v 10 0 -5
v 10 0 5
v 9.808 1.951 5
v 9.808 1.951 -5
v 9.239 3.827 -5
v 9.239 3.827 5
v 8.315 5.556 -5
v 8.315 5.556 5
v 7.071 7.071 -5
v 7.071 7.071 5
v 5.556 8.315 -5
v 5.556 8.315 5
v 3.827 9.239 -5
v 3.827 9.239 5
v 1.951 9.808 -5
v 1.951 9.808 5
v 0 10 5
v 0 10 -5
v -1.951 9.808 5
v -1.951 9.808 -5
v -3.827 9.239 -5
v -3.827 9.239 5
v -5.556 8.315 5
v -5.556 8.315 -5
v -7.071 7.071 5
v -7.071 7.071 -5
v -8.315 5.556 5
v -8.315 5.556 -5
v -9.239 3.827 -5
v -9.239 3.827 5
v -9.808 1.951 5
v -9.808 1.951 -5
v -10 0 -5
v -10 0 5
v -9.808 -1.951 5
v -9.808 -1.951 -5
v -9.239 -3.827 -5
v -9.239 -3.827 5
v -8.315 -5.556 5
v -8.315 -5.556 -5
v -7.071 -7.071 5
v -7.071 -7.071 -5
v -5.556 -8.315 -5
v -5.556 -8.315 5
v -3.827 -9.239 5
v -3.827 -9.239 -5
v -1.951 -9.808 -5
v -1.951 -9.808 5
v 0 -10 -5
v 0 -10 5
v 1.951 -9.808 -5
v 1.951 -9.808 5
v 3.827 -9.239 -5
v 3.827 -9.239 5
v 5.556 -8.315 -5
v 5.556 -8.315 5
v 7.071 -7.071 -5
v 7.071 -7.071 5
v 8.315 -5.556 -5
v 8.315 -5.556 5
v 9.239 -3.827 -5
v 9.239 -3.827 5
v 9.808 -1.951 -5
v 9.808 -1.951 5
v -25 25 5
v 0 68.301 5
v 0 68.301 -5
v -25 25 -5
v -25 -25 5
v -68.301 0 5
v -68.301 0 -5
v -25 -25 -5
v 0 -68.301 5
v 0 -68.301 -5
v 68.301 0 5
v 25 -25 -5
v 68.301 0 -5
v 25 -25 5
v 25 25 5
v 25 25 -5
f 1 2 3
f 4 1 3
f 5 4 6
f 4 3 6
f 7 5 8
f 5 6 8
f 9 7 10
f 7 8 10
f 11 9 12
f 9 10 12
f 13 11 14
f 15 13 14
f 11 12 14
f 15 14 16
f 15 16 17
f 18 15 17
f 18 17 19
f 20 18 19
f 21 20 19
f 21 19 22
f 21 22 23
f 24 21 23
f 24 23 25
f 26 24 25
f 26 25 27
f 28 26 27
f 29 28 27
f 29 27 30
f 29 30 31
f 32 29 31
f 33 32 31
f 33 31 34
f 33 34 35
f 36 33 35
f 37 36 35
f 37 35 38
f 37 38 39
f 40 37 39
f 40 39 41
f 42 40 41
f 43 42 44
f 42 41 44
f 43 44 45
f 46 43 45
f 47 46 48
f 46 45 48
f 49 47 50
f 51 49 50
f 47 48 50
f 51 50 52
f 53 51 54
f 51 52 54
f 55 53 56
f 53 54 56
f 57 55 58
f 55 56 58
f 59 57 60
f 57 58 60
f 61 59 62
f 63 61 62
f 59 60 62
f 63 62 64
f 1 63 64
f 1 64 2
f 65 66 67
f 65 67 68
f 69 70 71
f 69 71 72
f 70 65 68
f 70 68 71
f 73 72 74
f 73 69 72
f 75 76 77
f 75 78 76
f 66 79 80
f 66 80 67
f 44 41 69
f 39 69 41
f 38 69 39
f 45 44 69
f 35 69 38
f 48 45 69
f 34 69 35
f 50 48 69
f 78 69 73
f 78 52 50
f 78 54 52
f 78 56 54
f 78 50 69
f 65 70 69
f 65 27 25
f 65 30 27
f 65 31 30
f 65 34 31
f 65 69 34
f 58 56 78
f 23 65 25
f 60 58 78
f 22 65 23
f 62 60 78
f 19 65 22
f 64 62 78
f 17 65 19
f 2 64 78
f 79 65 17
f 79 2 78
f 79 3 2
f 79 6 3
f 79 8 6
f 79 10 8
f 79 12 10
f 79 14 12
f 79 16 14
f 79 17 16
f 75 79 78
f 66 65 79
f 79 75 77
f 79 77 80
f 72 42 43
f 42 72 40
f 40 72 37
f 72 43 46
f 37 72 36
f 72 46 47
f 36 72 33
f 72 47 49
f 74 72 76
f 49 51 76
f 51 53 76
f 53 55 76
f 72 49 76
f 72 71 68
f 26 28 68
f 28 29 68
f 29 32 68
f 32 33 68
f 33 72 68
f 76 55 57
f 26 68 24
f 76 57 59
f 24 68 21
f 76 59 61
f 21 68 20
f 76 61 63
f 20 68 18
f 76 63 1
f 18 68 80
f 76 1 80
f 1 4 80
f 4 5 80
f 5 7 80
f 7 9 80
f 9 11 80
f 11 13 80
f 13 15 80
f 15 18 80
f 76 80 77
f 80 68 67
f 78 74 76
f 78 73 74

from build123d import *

# Parameters (mm, degrees)
F0_W          = 50
F0_H          = 50
F1_DEPTH      = 5
F1_DEPTH_BACK = 5
F2_R          = 10
F3_DEPTH      = 10.001


with BuildPart() as f1:
    # F0 (on Top) → F1 (new body, two sides)
    with BuildSketch(Plane.XY) as f1_sk:
        Rectangle(F0_W, F0_H)
        Polygon((68.3012701892, 0), (25, 25), (25, -25), align=None)
        Polygon((-25, 25), (25, 25), (0, 68.3012701892), align=None)
        Polygon((-25, -25), (-25, 25), (-68.3012701892, 0), align=None)
        Polygon((0, -68.3012701892), (25, -25), (-25, -25), align=None)
    extrude(amount=F1_DEPTH)
    extrude(f1_sk.sketch, amount=-F1_DEPTH_BACK)

    # F2 (on face) → F3 (cut, through all)
    with BuildSketch(Plane.XY.offset(5)):
        Circle(F2_R)
    extrude(amount=-F3_DEPTH, mode=Mode.SUBTRACT)


solid = f1.part
